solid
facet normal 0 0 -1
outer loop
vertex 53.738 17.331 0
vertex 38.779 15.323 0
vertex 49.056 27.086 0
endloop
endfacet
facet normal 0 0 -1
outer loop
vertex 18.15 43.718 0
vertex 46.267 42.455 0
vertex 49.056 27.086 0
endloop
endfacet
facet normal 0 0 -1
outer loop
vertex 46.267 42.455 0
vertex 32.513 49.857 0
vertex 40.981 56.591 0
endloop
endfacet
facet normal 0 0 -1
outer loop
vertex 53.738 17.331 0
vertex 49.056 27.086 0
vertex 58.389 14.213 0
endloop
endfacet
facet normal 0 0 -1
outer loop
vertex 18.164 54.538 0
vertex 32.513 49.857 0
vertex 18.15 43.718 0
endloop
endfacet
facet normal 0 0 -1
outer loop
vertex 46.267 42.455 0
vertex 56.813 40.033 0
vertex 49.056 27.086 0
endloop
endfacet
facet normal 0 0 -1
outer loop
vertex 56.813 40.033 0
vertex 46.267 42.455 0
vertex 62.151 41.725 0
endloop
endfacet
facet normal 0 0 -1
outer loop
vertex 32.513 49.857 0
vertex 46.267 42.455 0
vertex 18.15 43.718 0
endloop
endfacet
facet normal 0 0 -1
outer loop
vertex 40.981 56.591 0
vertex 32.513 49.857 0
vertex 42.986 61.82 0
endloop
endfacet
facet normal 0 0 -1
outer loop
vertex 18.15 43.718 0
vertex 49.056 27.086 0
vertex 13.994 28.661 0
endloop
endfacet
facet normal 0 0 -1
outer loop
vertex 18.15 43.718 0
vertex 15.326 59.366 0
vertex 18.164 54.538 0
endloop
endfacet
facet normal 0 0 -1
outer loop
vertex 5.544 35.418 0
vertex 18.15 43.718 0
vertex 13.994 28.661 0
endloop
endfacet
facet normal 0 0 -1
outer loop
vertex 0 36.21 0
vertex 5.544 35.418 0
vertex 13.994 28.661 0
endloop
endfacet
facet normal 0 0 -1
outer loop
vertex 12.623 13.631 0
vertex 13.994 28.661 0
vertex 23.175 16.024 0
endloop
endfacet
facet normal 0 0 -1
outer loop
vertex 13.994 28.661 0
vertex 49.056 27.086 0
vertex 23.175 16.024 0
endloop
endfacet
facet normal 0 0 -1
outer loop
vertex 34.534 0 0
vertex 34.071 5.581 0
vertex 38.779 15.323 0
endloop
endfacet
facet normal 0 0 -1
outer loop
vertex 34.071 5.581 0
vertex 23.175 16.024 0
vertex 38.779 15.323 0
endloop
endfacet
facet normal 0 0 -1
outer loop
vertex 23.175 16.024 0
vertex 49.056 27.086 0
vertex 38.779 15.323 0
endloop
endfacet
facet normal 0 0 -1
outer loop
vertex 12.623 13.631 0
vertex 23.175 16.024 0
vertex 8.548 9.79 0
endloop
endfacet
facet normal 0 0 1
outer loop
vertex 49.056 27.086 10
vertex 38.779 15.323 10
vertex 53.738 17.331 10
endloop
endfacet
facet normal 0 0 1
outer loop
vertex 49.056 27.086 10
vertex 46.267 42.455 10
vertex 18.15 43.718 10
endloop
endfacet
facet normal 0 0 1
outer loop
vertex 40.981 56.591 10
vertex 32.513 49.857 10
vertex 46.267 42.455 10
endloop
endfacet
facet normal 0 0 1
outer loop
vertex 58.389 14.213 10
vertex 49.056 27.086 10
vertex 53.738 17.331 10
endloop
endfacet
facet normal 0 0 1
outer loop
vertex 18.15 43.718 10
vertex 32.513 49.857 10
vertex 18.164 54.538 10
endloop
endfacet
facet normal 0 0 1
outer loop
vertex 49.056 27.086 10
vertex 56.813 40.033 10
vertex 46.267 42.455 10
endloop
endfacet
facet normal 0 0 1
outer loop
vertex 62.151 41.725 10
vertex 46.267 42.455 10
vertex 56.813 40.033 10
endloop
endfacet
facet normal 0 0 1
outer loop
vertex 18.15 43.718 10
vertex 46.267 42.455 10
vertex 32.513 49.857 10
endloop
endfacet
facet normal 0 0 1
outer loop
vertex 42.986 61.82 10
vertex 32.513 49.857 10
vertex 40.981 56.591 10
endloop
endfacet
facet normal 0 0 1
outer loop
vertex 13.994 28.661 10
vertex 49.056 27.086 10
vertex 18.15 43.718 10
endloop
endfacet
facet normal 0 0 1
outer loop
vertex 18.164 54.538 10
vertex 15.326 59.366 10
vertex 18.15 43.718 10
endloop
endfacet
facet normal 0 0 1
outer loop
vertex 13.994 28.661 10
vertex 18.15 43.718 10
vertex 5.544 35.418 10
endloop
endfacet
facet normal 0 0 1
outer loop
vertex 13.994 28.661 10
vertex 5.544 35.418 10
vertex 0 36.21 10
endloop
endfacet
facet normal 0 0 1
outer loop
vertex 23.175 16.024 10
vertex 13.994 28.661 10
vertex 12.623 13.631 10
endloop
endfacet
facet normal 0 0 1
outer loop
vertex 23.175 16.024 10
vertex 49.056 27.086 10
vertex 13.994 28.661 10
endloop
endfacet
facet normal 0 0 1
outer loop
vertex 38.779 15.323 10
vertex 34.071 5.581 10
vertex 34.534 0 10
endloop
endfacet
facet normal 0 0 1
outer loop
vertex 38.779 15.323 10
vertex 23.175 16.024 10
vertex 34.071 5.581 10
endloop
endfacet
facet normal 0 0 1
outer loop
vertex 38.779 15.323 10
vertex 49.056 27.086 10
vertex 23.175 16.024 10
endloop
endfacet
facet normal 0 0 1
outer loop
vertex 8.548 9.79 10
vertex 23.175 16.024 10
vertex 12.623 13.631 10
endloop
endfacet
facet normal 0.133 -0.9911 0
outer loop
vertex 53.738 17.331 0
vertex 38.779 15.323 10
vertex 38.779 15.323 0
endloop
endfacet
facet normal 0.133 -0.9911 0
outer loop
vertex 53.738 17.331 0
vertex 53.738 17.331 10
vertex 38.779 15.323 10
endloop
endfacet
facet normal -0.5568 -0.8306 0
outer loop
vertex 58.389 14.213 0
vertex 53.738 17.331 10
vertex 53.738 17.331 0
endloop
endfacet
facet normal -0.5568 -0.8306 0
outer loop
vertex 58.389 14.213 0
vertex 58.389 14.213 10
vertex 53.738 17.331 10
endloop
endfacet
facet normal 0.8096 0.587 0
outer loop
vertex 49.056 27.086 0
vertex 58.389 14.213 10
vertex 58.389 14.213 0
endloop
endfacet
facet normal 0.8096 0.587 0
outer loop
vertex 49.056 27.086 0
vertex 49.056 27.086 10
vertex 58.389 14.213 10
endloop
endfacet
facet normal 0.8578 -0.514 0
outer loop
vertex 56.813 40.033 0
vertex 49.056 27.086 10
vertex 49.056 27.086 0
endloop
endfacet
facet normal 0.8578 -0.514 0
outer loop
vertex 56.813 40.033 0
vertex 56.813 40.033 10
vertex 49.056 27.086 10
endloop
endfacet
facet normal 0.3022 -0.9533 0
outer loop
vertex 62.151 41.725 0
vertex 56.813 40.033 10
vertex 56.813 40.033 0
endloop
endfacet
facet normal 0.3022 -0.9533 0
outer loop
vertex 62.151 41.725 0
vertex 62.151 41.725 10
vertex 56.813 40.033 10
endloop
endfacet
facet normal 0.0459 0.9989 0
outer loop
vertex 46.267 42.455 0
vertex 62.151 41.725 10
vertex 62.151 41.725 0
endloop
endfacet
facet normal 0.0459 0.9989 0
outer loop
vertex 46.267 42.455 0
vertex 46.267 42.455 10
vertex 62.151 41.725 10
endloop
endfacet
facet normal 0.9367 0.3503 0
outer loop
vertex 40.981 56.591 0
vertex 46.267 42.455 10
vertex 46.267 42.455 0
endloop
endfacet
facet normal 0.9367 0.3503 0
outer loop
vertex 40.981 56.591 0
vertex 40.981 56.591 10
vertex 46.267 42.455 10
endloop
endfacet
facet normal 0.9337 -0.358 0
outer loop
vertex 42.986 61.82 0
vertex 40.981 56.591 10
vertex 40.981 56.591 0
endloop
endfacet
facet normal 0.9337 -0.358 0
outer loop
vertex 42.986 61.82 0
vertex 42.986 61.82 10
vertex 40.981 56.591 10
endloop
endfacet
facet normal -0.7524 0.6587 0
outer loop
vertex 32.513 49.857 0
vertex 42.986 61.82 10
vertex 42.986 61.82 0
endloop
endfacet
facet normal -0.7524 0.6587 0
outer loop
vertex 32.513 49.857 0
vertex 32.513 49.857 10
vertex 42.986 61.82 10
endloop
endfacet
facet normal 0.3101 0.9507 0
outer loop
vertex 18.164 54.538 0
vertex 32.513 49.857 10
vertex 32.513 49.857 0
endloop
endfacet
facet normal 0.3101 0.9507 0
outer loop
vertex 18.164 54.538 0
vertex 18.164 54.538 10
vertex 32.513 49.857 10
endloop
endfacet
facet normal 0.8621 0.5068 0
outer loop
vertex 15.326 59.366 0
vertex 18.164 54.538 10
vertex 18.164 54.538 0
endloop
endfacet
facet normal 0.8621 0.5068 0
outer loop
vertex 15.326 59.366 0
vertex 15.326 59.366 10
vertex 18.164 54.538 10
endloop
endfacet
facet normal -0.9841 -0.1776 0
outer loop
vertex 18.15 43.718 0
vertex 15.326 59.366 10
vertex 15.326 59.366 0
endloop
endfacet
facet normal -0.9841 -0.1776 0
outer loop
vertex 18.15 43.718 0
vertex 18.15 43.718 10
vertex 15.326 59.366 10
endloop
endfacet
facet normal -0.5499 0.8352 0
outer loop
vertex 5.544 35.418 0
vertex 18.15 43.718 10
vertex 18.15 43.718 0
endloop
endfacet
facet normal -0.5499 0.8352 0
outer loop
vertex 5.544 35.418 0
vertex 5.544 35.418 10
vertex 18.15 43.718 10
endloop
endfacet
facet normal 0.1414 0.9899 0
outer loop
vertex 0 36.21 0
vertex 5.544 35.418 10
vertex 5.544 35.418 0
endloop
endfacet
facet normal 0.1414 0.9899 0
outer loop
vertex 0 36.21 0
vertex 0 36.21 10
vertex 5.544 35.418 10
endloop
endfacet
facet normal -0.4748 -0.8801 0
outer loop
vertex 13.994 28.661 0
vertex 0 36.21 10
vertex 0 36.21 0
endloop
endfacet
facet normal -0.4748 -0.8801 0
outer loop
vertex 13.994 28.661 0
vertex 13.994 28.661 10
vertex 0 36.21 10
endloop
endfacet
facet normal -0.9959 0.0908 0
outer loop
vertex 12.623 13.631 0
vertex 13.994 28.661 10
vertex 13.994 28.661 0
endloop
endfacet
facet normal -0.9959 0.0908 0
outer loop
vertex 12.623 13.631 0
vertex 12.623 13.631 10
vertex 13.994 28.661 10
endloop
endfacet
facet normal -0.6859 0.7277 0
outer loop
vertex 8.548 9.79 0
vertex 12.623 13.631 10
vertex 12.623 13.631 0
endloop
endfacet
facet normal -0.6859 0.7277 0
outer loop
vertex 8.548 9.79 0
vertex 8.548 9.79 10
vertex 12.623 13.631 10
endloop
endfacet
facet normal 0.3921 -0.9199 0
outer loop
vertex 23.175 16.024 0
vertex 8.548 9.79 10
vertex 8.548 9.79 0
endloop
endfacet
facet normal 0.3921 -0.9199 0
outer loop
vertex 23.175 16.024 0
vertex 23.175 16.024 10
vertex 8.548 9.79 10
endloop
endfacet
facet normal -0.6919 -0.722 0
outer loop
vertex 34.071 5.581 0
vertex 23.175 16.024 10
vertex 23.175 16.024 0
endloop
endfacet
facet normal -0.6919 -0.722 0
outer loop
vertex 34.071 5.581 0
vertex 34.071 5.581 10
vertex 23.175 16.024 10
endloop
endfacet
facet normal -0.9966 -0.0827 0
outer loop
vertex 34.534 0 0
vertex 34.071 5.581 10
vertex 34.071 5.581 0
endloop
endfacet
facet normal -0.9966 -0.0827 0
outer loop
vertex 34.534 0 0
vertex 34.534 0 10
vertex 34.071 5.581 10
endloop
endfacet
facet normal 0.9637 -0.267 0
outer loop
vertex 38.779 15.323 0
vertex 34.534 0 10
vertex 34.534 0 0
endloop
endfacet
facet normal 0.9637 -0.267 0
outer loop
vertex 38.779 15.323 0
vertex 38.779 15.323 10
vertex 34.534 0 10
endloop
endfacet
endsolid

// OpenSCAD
$fn = 32;

// ----------------------------------------------------------------------
// Fan rotor section: 7 blades, 18 mm hub radius, 14 mm blades
// ----------------------------------------------------------------------

// --- parameters (mm) ---
profile_height = 10;      // extrusion height
profile_points = 21;      // points of the closed outline

profile = [[49.056, 27.086], [56.813, 40.033], [62.151, 41.725], [46.267, 42.455], [40.981, 56.591], [42.986, 61.82], [32.513, 49.857], [18.164, 54.538], [15.326, 59.366], [18.15, 43.718], [5.544, 35.418], [0, 36.21], [13.994, 28.661], [12.623, 13.631], [8.548, 9.79], [23.175, 16.024], [34.071, 5.581], [34.534, 0], [38.779, 15.323], [53.738, 17.331], [58.389, 14.213]];  // single closed polygon, 21 points, counter clockwise

// --- the one profile operation ---
linear_extrude(height = profile_height) polygon(points = profile);
